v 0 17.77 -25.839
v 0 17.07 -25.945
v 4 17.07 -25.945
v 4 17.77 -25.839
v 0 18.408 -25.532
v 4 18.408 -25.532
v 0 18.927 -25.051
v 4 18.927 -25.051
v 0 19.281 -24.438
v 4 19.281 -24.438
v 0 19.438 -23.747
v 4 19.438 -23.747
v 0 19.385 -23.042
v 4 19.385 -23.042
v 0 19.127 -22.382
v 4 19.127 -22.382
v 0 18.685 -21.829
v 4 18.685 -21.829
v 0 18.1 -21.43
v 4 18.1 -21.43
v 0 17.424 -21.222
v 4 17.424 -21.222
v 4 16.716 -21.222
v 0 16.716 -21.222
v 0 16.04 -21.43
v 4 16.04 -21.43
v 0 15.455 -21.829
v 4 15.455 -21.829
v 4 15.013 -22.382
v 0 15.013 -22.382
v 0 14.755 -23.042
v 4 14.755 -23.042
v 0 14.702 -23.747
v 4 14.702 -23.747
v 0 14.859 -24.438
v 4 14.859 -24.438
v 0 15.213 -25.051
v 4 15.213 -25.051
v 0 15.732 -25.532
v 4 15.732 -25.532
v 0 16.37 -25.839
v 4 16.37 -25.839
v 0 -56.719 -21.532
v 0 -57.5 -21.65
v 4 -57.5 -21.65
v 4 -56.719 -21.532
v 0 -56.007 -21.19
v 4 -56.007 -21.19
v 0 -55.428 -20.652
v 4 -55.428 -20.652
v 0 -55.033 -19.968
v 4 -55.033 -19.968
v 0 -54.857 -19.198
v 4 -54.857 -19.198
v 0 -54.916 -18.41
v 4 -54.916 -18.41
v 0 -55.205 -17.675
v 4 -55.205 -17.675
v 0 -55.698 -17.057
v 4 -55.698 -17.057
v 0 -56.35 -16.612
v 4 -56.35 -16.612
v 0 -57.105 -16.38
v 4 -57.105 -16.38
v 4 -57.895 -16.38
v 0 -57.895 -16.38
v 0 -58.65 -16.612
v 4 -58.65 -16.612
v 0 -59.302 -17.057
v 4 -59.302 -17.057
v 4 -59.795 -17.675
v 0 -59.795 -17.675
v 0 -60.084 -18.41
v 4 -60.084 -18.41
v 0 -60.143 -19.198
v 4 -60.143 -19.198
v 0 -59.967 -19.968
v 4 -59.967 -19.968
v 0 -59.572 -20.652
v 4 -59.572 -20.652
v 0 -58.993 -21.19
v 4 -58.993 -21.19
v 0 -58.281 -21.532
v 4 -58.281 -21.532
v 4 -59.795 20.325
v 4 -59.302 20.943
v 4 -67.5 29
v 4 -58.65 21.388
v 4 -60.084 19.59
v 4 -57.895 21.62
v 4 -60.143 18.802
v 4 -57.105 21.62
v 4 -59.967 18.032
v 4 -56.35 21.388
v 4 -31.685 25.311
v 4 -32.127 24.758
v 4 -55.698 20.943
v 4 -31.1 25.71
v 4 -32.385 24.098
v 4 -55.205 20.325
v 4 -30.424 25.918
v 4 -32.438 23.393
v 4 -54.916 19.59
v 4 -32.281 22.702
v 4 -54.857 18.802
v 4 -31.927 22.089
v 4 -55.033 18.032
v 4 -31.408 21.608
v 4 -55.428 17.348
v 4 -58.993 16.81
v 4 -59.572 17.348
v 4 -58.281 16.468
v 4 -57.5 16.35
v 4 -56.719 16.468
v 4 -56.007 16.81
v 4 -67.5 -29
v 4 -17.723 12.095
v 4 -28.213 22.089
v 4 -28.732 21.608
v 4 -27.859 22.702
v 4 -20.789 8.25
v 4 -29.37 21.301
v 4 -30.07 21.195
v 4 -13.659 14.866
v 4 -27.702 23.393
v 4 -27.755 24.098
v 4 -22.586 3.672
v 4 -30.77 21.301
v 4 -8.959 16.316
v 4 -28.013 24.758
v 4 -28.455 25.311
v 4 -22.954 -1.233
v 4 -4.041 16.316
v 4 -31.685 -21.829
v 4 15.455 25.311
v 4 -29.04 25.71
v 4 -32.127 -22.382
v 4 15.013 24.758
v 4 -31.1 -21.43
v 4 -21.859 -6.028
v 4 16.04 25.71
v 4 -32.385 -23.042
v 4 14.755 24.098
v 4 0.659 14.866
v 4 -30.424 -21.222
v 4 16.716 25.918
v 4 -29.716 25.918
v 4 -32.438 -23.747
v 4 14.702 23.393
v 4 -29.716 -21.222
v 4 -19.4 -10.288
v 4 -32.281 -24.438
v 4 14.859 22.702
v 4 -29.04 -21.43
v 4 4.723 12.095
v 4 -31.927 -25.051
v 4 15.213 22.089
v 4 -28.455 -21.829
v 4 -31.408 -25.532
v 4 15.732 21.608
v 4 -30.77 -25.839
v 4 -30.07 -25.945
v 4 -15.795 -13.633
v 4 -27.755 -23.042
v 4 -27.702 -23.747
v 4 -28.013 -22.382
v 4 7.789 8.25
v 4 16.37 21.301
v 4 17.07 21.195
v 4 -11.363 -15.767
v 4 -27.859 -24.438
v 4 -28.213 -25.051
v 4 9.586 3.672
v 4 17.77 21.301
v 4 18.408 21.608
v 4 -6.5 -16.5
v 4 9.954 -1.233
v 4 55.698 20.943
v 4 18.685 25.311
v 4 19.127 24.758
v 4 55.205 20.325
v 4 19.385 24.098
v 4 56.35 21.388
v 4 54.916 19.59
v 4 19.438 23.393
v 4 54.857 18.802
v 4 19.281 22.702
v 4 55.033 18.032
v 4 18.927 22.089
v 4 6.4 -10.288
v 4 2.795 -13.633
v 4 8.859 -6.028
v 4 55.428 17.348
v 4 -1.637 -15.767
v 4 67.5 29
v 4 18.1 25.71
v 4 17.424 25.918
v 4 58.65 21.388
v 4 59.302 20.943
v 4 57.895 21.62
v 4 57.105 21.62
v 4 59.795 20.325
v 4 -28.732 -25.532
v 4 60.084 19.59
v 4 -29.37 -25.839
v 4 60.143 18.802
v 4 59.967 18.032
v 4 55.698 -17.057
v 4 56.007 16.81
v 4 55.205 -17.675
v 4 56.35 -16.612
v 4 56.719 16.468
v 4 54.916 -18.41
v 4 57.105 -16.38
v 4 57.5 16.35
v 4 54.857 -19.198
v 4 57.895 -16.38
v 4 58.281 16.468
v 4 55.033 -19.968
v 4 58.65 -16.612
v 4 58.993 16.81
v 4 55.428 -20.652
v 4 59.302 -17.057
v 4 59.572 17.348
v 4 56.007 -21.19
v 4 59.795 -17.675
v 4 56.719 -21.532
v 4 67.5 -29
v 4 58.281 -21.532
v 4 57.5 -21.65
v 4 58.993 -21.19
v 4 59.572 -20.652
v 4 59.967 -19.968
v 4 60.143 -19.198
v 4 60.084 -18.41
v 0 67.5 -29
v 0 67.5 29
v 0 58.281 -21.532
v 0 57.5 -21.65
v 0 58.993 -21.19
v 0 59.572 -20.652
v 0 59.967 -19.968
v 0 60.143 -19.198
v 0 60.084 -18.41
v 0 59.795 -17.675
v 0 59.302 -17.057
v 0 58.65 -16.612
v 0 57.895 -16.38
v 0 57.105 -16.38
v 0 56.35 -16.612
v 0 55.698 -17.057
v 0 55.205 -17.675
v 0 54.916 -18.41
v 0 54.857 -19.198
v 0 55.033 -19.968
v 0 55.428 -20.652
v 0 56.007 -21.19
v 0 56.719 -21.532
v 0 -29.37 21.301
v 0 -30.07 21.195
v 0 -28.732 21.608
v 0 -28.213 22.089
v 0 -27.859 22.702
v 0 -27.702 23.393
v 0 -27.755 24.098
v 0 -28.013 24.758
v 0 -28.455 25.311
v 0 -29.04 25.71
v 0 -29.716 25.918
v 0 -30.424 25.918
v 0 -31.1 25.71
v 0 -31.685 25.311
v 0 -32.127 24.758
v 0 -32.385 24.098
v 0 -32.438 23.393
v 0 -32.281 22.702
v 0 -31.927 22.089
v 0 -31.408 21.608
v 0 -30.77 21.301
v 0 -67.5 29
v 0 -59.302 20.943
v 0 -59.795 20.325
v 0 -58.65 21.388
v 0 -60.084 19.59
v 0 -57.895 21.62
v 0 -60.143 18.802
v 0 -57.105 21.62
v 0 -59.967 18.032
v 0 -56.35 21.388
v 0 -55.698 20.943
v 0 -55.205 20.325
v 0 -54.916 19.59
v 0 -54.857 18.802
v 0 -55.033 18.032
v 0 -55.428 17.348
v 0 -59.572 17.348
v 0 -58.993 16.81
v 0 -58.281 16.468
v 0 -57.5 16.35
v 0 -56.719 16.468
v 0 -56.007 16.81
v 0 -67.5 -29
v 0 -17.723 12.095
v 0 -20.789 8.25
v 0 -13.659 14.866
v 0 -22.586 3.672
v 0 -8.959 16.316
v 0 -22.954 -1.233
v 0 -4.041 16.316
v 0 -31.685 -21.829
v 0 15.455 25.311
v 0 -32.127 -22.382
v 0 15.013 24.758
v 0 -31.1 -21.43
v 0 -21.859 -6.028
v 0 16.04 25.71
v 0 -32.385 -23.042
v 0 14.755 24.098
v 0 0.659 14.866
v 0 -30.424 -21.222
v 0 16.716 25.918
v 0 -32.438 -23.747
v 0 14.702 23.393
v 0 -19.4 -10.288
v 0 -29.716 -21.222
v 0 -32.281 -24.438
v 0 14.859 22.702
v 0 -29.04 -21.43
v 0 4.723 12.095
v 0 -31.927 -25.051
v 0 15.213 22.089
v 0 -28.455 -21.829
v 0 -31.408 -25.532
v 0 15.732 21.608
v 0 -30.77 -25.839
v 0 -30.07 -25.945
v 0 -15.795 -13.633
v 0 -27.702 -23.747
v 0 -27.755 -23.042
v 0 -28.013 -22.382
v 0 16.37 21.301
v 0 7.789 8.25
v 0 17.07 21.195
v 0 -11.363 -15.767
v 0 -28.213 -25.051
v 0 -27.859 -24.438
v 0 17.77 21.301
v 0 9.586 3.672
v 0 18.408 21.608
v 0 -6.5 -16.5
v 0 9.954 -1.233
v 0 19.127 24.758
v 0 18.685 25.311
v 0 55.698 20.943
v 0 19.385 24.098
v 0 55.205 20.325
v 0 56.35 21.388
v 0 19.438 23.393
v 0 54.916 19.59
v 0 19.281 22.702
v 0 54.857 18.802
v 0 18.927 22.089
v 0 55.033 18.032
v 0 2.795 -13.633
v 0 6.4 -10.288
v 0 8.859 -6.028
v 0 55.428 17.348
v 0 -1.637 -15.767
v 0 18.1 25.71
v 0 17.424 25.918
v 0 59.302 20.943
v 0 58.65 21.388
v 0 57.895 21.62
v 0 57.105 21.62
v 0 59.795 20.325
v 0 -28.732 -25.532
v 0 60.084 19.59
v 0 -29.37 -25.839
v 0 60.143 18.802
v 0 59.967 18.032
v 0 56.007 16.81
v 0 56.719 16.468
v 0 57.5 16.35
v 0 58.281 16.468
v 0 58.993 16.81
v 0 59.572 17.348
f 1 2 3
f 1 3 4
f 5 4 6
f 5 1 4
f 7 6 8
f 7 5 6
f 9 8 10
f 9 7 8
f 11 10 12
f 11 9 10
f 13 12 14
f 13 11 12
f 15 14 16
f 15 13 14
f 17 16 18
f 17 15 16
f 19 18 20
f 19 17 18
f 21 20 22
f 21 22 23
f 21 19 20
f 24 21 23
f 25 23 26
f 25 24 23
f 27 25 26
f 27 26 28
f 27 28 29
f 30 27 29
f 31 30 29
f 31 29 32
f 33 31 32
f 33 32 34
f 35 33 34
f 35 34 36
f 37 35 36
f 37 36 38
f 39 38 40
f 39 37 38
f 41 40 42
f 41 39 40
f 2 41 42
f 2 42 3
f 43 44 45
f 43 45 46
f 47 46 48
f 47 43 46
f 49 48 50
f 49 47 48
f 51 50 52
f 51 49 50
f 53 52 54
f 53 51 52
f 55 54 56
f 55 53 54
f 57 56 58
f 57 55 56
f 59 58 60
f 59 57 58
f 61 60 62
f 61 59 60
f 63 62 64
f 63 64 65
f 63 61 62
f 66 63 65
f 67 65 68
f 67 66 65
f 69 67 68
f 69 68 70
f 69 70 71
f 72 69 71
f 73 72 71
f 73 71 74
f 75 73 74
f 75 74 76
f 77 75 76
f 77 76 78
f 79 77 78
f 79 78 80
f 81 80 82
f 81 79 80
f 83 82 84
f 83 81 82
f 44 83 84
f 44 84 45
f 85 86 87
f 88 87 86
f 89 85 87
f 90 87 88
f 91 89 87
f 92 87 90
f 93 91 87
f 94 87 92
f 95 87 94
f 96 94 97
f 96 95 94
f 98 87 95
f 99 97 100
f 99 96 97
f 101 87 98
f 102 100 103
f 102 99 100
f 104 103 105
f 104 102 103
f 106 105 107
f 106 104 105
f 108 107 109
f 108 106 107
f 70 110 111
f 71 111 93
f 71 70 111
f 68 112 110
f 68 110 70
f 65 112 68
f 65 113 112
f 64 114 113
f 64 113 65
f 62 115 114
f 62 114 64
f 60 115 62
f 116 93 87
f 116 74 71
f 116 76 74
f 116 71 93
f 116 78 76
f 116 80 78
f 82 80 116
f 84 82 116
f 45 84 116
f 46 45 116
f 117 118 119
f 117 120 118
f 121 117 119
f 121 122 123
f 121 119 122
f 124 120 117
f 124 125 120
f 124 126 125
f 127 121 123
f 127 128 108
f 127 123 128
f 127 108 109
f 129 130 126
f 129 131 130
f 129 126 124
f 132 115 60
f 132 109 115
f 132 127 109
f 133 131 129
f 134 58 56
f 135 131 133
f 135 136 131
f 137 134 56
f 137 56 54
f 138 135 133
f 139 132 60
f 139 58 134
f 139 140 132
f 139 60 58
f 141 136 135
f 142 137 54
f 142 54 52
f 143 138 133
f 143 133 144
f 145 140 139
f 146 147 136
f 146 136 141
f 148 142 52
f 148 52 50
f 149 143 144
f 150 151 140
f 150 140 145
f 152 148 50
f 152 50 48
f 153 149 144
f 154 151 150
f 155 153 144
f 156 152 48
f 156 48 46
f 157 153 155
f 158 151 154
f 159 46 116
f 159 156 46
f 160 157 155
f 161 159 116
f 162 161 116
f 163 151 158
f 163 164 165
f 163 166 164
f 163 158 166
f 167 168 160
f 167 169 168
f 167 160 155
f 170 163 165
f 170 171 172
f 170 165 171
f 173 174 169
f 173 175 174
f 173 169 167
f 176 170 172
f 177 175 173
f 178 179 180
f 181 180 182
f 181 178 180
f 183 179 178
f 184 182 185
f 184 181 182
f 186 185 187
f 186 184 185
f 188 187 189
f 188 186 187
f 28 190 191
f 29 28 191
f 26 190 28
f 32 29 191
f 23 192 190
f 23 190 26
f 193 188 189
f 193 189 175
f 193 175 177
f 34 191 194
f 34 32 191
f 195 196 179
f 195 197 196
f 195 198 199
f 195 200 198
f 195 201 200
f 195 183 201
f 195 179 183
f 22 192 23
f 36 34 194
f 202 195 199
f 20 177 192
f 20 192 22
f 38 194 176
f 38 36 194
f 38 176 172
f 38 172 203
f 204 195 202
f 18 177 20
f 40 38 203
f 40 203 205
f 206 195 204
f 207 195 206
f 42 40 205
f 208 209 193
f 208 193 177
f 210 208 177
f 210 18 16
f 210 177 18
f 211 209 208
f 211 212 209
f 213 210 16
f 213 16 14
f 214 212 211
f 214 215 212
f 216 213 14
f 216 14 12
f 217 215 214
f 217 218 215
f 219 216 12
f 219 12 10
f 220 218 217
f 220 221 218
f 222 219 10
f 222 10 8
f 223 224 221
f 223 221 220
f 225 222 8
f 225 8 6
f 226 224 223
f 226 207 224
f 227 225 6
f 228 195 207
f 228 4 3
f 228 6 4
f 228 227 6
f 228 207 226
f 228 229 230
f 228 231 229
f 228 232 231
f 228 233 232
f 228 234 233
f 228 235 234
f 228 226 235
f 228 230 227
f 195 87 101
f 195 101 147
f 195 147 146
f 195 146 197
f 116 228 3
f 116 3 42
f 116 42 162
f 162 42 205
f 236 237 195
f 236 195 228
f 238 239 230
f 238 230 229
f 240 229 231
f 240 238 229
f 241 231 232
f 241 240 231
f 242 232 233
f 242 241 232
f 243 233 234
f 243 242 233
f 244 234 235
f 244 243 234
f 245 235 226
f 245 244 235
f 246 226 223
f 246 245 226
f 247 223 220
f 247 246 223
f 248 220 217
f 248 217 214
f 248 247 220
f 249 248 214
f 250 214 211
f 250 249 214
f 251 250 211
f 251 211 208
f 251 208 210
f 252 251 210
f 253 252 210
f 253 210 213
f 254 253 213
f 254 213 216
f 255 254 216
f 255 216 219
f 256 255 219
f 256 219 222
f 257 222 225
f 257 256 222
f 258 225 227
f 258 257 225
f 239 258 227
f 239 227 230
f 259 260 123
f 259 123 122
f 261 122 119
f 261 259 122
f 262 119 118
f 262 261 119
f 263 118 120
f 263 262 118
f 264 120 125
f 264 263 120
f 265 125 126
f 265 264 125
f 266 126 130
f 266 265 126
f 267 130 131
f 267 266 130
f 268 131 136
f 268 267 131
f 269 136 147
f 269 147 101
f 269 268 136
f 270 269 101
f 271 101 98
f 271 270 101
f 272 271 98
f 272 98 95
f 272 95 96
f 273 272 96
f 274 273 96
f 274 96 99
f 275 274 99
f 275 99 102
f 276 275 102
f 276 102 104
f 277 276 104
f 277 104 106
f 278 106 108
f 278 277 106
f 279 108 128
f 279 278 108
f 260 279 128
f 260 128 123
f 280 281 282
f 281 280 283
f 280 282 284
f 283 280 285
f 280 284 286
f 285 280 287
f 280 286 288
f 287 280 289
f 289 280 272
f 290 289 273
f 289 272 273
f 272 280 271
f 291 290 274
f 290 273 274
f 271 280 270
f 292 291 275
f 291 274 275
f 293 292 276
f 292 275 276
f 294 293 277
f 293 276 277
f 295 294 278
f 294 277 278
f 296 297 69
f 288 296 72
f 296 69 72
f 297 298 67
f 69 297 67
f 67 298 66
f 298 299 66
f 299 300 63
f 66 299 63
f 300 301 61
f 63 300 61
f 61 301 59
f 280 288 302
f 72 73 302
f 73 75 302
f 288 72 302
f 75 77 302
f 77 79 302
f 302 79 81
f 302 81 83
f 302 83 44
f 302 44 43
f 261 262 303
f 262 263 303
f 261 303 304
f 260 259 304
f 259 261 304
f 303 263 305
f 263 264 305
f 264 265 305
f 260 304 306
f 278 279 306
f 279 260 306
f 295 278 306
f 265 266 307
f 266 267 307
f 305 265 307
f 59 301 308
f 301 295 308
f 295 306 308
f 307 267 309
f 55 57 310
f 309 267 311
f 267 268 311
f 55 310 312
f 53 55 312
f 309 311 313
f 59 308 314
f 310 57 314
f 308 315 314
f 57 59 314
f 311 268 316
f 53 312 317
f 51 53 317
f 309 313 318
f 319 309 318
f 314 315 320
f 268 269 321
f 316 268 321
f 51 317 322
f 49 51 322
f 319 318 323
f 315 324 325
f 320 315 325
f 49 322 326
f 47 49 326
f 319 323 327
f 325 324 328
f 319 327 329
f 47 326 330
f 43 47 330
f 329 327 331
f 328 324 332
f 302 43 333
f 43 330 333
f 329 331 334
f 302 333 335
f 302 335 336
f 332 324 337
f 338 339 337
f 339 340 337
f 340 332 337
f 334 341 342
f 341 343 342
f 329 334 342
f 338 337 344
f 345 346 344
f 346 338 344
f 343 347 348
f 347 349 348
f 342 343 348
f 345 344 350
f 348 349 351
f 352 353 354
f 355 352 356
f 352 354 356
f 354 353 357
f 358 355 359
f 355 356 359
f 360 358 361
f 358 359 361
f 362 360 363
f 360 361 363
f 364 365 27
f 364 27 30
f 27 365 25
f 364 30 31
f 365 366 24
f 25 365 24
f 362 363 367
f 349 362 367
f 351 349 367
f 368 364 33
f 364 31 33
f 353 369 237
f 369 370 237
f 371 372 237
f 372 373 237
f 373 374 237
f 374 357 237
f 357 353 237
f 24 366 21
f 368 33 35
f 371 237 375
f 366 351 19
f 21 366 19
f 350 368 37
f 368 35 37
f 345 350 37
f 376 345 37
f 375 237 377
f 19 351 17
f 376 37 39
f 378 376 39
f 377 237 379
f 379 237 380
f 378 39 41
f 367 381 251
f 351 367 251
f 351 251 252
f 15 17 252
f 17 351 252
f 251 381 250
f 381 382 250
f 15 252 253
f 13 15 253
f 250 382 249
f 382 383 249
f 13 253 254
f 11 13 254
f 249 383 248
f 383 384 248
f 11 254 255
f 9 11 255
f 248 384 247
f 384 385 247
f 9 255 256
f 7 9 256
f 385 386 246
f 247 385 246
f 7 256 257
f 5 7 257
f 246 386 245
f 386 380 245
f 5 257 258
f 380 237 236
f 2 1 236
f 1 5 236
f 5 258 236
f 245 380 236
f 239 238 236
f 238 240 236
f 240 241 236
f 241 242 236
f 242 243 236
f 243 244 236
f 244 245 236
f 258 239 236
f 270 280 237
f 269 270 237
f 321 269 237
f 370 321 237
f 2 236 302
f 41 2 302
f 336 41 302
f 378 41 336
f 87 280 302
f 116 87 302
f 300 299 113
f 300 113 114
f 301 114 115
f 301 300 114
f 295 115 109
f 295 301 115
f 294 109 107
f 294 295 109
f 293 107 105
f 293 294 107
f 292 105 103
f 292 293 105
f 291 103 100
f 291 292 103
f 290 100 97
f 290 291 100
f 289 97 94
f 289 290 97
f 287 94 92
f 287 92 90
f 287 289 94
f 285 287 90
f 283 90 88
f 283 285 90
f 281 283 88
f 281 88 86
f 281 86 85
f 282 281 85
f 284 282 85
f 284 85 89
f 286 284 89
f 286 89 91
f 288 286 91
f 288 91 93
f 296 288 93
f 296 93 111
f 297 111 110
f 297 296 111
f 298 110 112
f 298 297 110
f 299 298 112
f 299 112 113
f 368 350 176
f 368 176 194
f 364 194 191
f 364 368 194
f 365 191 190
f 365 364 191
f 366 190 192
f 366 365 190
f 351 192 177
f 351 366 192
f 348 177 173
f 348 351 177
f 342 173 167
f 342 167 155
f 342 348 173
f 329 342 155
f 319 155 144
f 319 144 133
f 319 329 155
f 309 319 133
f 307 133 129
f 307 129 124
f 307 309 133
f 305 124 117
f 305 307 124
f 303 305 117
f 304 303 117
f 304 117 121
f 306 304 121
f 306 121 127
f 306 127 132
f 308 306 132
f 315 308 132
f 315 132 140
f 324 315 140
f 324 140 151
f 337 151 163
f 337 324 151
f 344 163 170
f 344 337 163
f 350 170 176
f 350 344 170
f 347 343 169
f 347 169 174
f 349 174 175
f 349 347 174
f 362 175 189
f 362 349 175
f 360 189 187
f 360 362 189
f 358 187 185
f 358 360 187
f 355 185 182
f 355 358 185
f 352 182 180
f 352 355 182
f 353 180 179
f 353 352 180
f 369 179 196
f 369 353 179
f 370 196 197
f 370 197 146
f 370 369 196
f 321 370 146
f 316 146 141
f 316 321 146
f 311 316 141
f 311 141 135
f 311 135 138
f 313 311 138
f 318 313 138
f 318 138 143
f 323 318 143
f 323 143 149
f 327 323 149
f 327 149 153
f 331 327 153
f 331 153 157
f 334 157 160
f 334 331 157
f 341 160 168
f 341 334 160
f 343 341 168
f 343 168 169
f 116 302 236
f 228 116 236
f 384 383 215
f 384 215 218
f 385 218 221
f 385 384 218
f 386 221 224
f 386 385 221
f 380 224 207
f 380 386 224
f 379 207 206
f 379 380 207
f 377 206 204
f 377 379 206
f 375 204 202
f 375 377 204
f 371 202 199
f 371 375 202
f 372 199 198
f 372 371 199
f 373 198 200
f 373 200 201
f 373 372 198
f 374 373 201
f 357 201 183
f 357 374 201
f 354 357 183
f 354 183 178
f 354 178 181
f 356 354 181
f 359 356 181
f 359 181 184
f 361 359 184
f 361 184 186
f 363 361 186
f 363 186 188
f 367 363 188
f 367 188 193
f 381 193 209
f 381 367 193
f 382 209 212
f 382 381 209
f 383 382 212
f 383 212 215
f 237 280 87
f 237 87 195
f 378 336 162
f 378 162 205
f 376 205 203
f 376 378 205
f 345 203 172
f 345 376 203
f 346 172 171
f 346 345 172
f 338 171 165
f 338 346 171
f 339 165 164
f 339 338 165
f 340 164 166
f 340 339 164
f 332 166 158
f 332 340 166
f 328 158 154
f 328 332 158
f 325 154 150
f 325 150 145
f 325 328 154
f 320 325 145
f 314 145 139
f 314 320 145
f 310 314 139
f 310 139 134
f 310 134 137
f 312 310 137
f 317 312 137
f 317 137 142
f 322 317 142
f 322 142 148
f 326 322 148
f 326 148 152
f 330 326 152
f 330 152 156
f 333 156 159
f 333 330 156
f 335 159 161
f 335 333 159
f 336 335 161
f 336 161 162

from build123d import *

# Parameters (mm, degrees)
SKETCH1_W           = 58
SKETCH1_H           = 135
SKETCH1_R           = 16.5
SKETCH1_R_2         = 2.375
SKETCH1_R_3         = 2.65
BOSS_EXTRUDE1_DEPTH = 4


with BuildPart() as part:
    # Sketch1 → Boss-Extrude1 (new body)
    with BuildSketch(Plane(origin=(0, 0, 0), x_dir=(0, 0, -1), z_dir=(1, 0, 0))):
        Rectangle(SKETCH1_W, SKETCH1_H)
        with Locations((0, -6.5)):
            Circle(SKETCH1_R, mode=Mode.SUBTRACT)
        with Locations((23.57, 17.07)):
            Circle(SKETCH1_R_2, mode=Mode.SUBTRACT)
        with Locations((-23.57, 17.07)):
            Circle(SKETCH1_R_2, mode=Mode.SUBTRACT)
        with Locations((-23.57, -30.07)):
            Circle(SKETCH1_R_2, mode=Mode.SUBTRACT)
        with Locations((23.57, -30.07)):
            Circle(SKETCH1_R_2, mode=Mode.SUBTRACT)
        with Locations((-19, 57.5)):
            Circle(SKETCH1_R_3, mode=Mode.SUBTRACT)
        with Locations((19, 57.5)):
            Circle(SKETCH1_R_3, mode=Mode.SUBTRACT)
        with Locations((-19, -57.5)):
            Circle(SKETCH1_R_3, mode=Mode.SUBTRACT)
        with Locations((19, -57.5)):
            Circle(SKETCH1_R_3, mode=Mode.SUBTRACT)
    extrude(amount=BOSS_EXTRUDE1_DEPTH)


solid = part.part
